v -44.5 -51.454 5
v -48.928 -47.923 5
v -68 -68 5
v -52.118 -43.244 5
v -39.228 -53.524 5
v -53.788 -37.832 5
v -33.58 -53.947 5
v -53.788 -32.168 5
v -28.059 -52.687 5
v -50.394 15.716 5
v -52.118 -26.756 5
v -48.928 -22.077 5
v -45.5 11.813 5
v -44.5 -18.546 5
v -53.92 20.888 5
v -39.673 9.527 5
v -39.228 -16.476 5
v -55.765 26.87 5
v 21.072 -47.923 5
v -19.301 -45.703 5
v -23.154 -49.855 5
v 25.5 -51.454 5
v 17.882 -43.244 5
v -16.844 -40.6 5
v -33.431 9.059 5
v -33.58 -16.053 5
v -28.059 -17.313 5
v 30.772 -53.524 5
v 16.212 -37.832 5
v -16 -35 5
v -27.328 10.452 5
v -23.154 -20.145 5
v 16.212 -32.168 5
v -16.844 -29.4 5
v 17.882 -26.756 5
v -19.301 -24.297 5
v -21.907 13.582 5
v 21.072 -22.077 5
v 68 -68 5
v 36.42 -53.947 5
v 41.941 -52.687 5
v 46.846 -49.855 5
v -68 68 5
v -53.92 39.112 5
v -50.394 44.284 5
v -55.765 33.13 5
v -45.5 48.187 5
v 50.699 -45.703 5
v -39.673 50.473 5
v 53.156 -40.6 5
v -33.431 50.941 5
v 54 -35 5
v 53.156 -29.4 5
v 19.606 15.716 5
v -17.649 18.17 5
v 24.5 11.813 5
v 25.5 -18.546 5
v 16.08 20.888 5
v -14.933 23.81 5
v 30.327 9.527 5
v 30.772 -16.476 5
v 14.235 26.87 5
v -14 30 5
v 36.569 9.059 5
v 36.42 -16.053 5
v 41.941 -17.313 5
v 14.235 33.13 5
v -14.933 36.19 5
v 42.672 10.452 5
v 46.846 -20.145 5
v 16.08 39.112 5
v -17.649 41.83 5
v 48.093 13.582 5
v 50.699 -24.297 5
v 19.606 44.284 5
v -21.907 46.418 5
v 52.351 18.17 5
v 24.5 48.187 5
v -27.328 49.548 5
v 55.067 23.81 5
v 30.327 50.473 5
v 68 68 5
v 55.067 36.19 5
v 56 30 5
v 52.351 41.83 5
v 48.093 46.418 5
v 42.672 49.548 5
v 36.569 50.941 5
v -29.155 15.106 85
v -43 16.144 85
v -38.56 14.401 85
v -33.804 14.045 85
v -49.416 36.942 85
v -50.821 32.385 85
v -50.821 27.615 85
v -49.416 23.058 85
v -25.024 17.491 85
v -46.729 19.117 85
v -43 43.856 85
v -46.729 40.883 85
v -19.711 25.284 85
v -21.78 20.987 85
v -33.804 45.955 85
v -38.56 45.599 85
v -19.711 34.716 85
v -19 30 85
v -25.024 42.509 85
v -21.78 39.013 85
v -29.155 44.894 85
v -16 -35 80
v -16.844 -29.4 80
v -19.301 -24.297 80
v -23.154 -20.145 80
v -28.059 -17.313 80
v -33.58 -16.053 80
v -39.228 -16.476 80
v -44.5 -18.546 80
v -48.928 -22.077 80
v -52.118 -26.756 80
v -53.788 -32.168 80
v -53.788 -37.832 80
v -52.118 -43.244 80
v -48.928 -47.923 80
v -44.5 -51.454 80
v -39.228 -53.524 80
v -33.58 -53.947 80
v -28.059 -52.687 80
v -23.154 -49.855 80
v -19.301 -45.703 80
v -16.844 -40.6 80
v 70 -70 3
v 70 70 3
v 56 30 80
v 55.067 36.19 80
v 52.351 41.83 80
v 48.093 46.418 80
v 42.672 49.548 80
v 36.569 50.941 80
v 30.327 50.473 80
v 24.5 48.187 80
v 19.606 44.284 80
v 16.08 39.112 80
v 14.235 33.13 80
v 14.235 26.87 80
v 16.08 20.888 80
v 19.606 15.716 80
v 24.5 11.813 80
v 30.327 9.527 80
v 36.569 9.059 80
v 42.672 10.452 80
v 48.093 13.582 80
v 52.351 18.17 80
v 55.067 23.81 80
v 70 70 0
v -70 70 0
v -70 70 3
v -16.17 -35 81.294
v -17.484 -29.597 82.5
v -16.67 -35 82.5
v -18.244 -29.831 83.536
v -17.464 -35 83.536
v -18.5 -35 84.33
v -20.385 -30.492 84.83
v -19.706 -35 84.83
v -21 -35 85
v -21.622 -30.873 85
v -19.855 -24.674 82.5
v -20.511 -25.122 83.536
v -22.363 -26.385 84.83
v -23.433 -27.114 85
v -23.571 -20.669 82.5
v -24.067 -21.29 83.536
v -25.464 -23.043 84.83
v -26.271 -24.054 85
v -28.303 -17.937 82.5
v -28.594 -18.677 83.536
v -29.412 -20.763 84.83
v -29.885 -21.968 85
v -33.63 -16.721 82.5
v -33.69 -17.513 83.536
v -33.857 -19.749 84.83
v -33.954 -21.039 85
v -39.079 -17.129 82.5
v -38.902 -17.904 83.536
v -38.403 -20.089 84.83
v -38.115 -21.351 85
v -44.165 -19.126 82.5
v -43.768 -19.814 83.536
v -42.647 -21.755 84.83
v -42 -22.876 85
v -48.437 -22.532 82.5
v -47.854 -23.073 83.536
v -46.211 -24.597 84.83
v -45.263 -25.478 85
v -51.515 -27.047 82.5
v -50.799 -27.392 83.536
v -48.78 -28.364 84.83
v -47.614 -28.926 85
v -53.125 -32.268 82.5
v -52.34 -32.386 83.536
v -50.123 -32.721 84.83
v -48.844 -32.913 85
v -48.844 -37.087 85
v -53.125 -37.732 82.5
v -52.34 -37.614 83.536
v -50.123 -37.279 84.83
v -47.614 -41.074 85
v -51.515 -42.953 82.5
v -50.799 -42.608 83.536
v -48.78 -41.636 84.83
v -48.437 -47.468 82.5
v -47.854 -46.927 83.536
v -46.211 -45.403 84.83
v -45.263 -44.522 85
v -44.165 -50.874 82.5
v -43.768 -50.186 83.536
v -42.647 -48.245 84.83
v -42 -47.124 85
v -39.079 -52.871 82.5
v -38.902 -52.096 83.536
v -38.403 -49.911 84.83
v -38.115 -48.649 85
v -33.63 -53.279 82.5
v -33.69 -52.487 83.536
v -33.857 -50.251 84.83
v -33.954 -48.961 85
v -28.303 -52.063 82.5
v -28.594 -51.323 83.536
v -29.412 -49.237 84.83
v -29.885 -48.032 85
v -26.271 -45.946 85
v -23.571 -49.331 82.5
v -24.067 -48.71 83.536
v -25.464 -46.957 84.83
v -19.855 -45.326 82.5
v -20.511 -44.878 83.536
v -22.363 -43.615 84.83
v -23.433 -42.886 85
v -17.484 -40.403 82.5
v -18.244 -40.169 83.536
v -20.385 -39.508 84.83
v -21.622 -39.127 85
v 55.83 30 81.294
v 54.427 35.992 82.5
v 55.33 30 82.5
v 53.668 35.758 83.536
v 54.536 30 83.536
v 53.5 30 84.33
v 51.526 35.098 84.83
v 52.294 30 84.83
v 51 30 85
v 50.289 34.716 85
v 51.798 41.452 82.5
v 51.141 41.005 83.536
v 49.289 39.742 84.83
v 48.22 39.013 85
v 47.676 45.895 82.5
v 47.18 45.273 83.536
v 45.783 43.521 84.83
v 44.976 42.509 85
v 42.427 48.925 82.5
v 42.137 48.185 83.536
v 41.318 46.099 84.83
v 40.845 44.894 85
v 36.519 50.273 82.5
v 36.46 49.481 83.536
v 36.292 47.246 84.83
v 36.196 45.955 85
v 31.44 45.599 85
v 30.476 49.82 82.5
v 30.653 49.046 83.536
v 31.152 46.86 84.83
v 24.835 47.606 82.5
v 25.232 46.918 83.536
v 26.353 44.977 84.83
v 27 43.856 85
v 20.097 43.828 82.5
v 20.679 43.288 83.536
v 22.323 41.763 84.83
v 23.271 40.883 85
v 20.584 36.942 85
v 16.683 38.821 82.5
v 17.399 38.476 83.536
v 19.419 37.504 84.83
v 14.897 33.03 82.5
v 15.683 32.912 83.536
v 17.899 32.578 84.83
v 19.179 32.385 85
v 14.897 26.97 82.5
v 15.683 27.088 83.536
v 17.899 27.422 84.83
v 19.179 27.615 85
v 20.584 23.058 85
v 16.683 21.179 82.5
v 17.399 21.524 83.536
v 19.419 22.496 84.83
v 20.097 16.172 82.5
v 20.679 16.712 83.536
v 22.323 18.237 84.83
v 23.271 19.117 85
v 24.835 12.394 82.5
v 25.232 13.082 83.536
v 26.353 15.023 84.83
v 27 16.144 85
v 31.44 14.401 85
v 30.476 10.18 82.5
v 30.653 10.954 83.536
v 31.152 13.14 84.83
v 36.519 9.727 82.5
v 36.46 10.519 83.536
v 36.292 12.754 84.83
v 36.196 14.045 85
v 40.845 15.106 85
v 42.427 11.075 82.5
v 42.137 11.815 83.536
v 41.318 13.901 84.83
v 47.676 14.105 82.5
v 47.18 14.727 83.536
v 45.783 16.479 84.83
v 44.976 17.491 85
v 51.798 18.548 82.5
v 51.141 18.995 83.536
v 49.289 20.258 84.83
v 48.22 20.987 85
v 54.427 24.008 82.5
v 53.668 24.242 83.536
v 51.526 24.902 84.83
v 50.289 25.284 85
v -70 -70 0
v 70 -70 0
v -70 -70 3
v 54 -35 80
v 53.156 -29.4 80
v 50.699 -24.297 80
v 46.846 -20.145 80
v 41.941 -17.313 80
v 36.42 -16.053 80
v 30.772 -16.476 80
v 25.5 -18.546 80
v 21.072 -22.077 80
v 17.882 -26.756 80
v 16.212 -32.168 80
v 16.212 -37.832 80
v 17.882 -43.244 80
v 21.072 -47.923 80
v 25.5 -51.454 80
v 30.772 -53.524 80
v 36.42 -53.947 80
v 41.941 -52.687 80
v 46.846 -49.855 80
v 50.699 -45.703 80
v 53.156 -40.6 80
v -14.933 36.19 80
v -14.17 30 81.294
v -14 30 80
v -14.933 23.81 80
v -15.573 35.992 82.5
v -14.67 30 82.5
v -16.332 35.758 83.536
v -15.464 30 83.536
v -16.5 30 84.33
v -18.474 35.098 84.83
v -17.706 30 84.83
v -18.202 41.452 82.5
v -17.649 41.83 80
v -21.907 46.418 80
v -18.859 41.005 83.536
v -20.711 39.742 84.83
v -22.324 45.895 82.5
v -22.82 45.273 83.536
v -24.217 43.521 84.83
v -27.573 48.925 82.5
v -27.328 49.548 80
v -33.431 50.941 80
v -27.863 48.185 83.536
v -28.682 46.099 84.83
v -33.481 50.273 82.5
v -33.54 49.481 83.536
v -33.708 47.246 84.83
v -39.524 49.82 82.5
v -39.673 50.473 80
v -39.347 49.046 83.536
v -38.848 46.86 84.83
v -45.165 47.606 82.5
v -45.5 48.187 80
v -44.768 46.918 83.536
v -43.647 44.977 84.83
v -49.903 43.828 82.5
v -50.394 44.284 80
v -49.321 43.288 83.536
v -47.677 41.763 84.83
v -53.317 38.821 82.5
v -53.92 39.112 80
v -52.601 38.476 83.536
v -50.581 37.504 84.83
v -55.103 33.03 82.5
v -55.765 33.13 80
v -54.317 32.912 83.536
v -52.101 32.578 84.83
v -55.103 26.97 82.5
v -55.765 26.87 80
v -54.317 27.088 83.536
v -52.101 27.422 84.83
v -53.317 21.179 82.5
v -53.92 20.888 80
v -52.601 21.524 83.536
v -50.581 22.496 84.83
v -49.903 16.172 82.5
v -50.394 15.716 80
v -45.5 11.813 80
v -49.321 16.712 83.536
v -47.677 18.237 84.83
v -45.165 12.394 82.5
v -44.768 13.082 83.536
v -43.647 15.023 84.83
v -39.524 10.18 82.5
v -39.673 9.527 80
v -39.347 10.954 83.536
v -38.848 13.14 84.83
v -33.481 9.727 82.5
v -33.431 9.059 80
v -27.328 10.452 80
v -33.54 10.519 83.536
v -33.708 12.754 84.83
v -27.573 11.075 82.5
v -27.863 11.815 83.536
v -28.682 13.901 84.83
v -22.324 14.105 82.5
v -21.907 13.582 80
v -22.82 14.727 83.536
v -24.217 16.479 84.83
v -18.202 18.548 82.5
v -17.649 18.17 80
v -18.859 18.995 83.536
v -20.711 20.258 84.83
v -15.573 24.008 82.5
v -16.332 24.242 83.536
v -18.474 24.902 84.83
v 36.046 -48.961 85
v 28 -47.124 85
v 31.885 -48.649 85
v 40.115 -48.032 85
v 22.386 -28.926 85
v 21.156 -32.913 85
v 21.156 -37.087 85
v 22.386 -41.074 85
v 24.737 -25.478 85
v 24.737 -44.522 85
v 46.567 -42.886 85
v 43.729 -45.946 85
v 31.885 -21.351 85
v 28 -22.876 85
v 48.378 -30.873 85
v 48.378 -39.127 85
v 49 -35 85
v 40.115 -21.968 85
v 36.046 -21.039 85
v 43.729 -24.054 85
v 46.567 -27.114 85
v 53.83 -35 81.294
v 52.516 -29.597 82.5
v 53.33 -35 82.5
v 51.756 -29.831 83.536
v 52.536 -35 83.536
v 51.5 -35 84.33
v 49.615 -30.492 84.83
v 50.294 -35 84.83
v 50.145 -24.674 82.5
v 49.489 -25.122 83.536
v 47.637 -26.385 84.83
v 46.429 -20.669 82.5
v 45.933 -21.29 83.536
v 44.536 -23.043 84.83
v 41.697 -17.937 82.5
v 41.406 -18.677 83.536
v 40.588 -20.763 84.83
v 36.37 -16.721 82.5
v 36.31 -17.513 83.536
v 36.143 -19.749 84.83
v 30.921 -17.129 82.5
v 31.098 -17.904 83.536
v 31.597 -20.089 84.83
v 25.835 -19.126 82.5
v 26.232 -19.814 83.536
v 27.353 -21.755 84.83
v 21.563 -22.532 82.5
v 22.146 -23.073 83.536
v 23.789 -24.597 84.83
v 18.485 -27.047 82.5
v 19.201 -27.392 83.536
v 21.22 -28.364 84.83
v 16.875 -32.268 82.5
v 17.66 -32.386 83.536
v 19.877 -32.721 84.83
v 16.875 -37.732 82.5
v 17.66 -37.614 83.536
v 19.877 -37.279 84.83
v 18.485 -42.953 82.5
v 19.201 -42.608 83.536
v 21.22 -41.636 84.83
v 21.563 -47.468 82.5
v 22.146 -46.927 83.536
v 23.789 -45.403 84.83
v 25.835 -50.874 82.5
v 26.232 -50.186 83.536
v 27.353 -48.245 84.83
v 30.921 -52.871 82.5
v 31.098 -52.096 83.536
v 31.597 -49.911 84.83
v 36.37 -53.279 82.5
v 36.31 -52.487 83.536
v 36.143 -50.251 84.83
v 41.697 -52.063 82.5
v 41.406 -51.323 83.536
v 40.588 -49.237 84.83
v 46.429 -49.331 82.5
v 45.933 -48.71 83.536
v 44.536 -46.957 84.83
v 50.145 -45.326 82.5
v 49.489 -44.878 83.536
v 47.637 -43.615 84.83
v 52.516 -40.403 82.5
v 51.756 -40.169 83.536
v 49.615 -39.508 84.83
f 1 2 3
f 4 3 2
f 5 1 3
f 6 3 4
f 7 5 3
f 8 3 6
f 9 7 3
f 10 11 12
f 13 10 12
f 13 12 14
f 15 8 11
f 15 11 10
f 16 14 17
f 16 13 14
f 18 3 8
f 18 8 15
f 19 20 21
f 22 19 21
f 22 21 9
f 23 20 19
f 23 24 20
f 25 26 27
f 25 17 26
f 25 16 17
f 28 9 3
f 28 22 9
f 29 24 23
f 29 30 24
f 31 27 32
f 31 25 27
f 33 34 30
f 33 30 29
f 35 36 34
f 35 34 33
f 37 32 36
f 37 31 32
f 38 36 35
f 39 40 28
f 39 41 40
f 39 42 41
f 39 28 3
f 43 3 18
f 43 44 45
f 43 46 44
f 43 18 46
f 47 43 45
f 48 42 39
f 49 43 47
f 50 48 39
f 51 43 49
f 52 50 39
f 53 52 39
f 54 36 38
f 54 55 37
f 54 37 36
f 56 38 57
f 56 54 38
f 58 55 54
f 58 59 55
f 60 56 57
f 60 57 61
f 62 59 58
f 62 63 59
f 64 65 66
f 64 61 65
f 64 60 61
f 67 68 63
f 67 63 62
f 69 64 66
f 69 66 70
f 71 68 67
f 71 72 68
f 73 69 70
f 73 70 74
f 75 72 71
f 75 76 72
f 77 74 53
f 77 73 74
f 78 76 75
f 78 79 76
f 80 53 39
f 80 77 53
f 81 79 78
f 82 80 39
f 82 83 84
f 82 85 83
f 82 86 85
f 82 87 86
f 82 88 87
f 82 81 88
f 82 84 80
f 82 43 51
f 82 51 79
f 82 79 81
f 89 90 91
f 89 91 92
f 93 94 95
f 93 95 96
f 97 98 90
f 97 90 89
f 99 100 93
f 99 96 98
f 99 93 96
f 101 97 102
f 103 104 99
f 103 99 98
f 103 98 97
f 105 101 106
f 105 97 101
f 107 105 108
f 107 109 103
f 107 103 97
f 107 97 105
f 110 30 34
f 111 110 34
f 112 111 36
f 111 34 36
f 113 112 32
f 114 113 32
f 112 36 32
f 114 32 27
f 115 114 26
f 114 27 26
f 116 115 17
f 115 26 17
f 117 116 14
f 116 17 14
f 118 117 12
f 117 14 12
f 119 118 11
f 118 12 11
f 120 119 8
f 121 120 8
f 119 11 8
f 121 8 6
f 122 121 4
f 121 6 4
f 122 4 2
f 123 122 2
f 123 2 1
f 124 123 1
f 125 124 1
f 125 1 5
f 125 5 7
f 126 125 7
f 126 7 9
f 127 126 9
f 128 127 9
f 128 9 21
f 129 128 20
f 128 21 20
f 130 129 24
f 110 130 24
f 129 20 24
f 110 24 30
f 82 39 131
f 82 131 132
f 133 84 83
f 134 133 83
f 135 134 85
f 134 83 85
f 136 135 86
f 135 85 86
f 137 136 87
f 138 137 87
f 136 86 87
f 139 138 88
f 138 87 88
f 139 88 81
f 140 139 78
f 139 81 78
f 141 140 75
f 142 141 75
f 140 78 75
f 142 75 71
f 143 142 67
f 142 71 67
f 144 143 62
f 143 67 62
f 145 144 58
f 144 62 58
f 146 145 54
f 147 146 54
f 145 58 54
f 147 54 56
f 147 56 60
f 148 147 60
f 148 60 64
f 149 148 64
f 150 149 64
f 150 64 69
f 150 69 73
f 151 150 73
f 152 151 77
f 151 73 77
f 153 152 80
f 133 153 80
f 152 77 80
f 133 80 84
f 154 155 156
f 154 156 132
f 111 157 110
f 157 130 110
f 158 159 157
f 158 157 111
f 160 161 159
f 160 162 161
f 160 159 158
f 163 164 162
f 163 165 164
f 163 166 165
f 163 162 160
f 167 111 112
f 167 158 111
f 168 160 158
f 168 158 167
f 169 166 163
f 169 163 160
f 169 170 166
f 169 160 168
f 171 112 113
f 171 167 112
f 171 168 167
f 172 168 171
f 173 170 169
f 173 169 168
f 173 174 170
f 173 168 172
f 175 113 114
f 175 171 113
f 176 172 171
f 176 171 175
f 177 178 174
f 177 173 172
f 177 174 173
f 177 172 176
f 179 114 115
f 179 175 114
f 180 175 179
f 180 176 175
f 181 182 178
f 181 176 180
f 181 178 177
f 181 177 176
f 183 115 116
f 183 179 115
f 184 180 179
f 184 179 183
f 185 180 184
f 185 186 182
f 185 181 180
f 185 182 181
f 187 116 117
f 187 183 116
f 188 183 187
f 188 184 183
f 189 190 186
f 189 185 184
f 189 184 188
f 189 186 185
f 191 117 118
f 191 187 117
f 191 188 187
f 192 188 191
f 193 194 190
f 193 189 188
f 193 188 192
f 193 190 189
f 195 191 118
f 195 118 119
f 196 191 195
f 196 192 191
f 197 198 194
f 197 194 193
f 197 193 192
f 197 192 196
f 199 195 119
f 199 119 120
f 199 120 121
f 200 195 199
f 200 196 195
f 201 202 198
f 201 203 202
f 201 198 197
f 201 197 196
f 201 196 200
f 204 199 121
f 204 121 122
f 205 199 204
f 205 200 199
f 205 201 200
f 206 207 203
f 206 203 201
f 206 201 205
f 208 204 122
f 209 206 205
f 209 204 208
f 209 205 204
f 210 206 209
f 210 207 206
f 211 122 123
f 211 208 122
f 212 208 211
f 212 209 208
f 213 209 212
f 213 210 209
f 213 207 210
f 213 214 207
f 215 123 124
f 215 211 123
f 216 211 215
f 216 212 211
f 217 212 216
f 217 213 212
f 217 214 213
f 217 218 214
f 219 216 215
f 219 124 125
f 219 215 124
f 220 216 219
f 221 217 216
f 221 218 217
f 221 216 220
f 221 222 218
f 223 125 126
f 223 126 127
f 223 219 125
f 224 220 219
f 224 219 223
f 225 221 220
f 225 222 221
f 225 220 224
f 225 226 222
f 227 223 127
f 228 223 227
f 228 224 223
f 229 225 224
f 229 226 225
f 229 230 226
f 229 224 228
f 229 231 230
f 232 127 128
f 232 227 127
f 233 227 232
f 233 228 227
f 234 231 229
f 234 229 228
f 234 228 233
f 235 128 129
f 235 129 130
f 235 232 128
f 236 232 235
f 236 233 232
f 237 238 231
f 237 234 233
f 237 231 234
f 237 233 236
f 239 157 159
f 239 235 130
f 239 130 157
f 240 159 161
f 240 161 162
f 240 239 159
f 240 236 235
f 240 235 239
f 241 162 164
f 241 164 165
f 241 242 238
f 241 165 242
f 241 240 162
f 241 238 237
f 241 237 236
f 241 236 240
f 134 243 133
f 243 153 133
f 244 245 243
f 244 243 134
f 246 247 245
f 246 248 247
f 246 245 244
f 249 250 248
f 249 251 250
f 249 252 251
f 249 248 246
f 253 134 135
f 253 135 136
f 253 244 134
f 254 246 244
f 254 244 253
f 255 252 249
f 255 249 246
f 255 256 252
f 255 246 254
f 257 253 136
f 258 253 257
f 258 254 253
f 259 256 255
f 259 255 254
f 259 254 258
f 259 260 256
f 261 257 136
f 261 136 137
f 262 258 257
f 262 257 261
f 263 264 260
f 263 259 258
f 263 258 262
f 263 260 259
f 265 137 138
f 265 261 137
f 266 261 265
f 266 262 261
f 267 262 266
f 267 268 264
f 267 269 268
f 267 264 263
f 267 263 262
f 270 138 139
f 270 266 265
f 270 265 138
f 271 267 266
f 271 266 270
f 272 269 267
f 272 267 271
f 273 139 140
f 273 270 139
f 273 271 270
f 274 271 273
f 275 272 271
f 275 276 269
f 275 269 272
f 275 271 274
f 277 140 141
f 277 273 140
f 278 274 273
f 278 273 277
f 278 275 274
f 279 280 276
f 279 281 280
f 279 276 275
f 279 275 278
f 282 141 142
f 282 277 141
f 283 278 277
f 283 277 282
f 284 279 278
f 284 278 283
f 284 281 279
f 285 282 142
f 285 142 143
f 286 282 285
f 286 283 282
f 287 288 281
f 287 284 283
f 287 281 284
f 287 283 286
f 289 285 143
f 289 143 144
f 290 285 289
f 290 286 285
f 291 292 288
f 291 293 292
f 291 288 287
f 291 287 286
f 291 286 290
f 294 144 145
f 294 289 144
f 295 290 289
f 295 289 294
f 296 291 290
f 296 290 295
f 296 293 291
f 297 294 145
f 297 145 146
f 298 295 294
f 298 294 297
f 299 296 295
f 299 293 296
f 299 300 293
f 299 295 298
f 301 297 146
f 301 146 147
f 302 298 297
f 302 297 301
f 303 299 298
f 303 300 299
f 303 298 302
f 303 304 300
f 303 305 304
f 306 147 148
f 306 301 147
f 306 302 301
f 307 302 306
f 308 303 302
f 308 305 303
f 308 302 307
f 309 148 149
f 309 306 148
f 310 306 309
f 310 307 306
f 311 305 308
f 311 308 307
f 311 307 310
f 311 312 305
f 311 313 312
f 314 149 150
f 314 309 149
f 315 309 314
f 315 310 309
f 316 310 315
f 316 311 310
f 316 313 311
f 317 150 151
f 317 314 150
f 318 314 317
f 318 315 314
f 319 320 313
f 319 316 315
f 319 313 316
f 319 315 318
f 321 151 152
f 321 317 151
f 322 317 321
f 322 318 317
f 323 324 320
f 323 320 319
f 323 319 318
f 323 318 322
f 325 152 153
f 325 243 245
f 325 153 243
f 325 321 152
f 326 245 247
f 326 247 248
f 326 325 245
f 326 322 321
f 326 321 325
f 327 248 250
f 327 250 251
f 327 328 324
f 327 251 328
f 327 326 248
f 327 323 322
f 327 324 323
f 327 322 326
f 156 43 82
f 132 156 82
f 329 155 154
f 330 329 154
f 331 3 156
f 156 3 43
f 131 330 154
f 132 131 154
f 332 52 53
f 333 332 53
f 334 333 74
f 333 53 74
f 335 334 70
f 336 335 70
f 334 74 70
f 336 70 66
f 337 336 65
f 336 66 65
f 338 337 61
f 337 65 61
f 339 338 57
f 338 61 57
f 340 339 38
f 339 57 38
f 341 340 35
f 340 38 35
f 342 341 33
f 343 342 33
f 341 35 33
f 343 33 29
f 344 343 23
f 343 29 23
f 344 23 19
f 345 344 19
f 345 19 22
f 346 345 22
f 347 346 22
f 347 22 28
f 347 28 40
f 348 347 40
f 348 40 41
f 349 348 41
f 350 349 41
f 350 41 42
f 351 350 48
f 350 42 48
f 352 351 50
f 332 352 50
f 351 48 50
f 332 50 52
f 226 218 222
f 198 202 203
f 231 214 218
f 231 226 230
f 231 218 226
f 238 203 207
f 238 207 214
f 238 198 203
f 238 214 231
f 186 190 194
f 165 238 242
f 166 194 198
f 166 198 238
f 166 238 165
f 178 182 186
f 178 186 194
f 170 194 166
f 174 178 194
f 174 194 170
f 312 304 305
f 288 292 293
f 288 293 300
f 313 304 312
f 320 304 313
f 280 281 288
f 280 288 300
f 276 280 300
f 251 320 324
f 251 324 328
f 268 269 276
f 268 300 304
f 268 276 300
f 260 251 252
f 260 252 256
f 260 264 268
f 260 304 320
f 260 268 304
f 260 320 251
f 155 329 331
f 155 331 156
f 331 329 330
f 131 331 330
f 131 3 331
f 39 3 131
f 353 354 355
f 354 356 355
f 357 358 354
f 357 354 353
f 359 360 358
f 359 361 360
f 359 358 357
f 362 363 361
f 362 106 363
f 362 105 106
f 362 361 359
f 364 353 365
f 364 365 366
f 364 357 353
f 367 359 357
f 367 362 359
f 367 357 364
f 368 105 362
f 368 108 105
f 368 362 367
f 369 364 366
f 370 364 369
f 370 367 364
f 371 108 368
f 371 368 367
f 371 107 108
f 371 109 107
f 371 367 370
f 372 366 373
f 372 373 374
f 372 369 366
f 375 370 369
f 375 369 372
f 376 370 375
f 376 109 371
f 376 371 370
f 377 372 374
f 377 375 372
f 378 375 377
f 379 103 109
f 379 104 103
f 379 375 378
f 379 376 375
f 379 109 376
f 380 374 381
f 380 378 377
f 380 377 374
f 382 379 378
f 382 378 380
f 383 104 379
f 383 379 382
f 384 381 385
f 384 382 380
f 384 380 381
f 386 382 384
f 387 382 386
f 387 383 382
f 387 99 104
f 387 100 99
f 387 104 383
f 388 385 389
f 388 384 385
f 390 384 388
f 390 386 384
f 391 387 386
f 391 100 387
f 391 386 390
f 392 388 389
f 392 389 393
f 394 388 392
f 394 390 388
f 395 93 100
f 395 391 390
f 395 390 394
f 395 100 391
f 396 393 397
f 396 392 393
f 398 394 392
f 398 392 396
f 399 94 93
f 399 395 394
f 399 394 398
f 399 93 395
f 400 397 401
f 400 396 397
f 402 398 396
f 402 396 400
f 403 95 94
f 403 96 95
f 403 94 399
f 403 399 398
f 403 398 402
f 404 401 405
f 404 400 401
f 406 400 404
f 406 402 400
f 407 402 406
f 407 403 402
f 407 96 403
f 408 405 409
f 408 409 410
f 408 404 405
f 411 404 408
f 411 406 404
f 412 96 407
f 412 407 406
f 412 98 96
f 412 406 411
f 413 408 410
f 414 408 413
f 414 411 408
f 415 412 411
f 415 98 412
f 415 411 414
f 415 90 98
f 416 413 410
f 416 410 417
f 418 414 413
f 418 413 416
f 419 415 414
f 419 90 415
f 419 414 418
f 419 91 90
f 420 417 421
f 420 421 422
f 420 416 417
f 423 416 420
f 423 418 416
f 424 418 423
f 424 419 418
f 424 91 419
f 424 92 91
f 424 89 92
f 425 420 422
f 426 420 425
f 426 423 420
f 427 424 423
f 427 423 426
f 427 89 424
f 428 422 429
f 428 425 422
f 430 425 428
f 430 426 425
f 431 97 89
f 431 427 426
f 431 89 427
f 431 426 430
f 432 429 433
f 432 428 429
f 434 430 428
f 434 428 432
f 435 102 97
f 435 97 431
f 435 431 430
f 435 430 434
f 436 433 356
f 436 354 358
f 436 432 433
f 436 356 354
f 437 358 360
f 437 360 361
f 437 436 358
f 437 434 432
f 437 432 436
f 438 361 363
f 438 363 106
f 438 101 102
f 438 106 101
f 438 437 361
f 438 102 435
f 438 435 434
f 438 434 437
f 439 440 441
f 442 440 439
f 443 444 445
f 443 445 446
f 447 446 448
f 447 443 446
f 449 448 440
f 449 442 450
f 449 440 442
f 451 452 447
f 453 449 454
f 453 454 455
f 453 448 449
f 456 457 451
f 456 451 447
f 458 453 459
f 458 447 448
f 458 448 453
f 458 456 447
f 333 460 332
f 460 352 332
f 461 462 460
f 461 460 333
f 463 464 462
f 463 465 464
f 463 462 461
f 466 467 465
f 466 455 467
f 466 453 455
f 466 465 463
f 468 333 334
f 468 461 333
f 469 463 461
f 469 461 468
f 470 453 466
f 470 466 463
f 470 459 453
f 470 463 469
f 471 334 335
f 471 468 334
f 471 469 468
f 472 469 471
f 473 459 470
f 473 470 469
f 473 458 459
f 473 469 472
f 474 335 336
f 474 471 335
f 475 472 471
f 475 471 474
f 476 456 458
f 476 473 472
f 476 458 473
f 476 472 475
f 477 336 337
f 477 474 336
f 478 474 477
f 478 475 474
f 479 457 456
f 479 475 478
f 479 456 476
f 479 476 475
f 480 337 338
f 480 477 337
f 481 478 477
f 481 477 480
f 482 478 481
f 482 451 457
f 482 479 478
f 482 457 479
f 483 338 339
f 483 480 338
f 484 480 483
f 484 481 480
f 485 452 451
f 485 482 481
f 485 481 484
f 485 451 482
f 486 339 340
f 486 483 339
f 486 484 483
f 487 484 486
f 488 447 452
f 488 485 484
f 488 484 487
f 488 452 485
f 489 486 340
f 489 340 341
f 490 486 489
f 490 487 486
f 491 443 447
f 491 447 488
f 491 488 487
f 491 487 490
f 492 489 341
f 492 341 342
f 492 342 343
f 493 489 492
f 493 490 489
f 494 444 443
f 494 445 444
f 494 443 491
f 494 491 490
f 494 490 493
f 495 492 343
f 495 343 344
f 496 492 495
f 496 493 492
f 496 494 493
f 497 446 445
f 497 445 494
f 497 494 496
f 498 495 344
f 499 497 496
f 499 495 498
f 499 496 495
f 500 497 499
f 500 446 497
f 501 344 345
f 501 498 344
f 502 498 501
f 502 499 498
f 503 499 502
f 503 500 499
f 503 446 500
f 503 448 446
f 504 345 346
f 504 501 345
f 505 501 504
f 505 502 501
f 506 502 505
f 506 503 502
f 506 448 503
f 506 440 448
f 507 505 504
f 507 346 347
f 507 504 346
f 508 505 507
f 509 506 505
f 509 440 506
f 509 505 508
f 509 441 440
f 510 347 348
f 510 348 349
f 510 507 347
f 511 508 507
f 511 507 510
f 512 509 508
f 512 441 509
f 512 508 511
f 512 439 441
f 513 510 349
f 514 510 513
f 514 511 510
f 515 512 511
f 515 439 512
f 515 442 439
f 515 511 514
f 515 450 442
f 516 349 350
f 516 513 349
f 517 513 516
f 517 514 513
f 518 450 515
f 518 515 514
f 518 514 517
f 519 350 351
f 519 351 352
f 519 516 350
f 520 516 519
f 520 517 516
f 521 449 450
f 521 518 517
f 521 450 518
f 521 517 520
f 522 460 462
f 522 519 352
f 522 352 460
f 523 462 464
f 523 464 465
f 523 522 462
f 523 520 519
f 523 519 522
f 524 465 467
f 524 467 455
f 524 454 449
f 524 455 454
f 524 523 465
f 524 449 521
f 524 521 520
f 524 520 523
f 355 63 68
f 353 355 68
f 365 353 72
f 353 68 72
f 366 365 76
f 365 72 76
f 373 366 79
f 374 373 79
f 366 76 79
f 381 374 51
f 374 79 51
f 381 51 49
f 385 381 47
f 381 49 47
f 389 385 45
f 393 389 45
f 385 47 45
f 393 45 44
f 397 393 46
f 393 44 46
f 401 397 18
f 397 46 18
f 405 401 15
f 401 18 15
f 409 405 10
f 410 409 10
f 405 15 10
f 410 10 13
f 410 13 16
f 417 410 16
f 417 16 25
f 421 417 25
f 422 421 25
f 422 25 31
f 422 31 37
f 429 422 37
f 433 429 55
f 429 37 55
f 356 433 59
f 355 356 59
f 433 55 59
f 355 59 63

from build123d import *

# Parameters (mm, degrees)
F0_W     = 140
F0_H     = 140
F1_DEPTH = 5
F2_SIZE  = 2
F3_R     = 21
F3_R_2   = 19
F4_DEPTH = 80
F5_R     = 5


with BuildPart() as f1:
    # F0 (on Top) → F1 (new body)
    with BuildSketch(Plane.XY):
        Rectangle(F0_W, F0_H)
    extrude(amount=F1_DEPTH)

    # F2
    f2_edges = [f1.edges().sort_by_distance(p)[0] for p in [
        (0, -70, 5),
        (0, 70, 5),
        (-70, 0, 5),
        (70, 0, 5),
    ]]
    chamfer(f2_edges, length=F2_SIZE)

    # F3 (on face) → F4 (join)
    with BuildSketch(Plane.XY.offset(5)):
        with Locations((-35, 30)):
            Circle(F3_R)
        with Locations((35, 30)):
            Circle(F3_R)
        with Locations((-35, -35)):
            Circle(F3_R_2)
        with Locations((35, -35)):
            Circle(F3_R_2)
    extrude(amount=F4_DEPTH)

    # F5
    f5_edges = [f1.edges().sort_by_distance(p)[0] for p in [
        (-56, 30, 85),
        (14, 30, 85),
        (-54, -35, 85),
        (16, -35, 85),
    ]]
    fillet(f5_edges, radius=F5_R)


solid = f1.part
